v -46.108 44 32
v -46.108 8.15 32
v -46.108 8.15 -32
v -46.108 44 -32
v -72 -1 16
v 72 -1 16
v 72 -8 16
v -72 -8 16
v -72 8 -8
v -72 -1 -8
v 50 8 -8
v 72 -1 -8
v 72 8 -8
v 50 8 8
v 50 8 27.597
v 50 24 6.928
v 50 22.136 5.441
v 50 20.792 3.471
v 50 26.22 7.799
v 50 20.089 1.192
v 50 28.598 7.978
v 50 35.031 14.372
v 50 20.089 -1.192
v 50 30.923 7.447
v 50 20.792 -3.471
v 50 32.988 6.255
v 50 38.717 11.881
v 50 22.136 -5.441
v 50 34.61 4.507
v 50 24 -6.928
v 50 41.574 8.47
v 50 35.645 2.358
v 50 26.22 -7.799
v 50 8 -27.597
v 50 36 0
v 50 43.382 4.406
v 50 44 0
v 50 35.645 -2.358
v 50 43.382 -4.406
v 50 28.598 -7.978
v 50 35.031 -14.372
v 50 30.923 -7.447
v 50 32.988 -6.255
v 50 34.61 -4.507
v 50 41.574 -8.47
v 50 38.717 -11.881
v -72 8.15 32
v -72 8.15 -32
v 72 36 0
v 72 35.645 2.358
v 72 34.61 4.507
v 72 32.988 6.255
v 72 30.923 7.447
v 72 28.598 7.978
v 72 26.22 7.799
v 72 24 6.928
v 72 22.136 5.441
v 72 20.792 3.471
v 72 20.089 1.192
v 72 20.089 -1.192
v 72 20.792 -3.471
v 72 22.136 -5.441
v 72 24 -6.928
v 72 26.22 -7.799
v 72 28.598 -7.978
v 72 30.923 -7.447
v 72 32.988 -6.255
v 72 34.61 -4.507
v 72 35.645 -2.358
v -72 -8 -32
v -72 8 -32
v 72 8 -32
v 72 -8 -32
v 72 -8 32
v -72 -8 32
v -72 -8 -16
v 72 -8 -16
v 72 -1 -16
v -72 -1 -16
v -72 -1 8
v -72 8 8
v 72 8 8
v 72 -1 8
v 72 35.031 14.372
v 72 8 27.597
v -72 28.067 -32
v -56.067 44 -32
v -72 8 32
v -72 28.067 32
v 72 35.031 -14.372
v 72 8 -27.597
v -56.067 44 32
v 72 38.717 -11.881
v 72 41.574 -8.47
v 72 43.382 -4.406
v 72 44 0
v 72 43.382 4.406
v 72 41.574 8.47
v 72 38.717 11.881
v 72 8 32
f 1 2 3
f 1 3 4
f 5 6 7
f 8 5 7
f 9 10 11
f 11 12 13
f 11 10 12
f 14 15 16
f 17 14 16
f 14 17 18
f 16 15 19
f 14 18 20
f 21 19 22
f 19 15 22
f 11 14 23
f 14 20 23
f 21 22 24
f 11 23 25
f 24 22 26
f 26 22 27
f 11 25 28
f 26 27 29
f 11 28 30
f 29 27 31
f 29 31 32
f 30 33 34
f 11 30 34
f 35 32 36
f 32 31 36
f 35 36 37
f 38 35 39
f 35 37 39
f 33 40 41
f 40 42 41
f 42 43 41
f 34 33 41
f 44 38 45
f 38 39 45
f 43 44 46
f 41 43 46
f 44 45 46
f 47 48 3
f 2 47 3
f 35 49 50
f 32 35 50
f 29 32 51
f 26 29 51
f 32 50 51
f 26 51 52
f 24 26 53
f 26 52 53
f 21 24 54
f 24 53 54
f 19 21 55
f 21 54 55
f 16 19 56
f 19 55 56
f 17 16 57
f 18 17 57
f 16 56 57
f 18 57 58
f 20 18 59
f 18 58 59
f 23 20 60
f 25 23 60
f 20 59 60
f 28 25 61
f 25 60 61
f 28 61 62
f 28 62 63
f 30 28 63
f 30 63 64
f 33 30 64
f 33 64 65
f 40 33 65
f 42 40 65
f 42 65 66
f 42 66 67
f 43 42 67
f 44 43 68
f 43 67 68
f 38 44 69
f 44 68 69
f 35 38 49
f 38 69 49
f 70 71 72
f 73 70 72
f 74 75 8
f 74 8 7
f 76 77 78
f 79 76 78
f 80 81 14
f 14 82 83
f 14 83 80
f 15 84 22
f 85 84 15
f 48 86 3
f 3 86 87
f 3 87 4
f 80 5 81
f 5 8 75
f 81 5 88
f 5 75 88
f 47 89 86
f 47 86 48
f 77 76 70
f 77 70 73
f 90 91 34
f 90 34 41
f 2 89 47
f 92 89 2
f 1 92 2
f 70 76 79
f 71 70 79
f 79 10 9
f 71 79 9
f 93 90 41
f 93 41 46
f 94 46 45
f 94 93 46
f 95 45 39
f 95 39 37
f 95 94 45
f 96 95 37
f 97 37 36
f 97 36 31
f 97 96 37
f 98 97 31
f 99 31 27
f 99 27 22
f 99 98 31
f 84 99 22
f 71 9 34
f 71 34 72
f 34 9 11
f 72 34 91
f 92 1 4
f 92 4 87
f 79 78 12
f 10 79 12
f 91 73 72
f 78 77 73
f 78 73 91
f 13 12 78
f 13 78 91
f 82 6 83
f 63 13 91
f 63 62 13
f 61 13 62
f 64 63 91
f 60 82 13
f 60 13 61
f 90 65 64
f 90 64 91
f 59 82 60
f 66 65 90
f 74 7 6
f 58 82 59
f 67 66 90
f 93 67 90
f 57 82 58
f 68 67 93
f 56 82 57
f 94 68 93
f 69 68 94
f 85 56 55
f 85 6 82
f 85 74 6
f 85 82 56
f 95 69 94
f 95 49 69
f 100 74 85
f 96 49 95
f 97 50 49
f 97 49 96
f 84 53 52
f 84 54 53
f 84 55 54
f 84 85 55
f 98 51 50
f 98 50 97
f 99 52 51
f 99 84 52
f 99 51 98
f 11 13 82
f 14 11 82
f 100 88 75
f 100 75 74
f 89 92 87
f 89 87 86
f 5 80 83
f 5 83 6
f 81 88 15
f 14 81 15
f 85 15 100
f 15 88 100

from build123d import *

# Parameters (mm, degrees)
SKETCH1_W           = 144
SKETCH1_H           = 16
BOSS_EXTRUDE1_DEPTH = 32
BOSS_EXTRUDE2_DEPTH = 64
SKETCH3_R           = 8
BOSS_EXTRUDE3_DEPTH = 22
CUT_EXTRUDE1_DEPTH  = 154.935051239


with BuildPart() as part:
    # Sketch1 → Boss-Extrude1 (new, symmetric)
    with BuildSketch(Plane.XY):
        Rectangle(SKETCH1_W, SKETCH1_H)
    extrude(amount=BOSS_EXTRUDE1_DEPTH, both=True)

    # Sketch3 → Boss-Extrude3 (add)
    with BuildSketch(Plane(origin=(72, 0, 0), x_dir=(0, 0, -1), z_dir=(1, 0, 0))):
        with BuildLine():
            Line((-27.596884244, 8), (-32, 8))
            Line((-32, 8), (-32, -8))
            Line((-32, -8), (32, -8))
            Line((32, -8), (32, 8))
            Line((32, 8), (27.596884244, 8))
            Line((27.596884244, 8), (14.372185951, 35.031377602))
            ThreePointArc((14.372185951, 35.031377602), (0, 44), (-14.372185951, 35.031377602))
            Line((-14.372185951, 35.031377602), (-27.596884244, 8))
        make_face()
        with Locations(Location((0, 28, 0), (0, 0, 90))):
            Circle(SKETCH3_R, mode=Mode.SUBTRACT)
    extrude(amount=-BOSS_EXTRUDE3_DEPTH)

    # Sketch4 → Cut-Extrude1 (cut, through all)
    with BuildSketch(Plane(origin=(72, 0, 0), x_dir=(0, 0, -1), z_dir=(1, 0, 0))):
        Polygon((8, 8), (-8, 8), (-8, -1), (-16, -1), (-16, -8), (16, -8), (16, -1), (8, -1), align=None)
    extrude(amount=-CUT_EXTRUDE1_DEPTH, mode=Mode.SUBTRACT)


with BuildPart() as body_2:
    # Sketch2 → Boss-Extrude2 (new body)
    with BuildSketch(Plane.XY.offset(32)):
        Polygon((-72, 8.15004748), (-46.108367624, 8.15004748), (-46.108367624, 44), (-56.066687769, 44), (-72, 28.066687769), align=None)
    extrude(amount=-BOSS_EXTRUDE2_DEPTH)


solid = Compound([part.part, body_2.part])
